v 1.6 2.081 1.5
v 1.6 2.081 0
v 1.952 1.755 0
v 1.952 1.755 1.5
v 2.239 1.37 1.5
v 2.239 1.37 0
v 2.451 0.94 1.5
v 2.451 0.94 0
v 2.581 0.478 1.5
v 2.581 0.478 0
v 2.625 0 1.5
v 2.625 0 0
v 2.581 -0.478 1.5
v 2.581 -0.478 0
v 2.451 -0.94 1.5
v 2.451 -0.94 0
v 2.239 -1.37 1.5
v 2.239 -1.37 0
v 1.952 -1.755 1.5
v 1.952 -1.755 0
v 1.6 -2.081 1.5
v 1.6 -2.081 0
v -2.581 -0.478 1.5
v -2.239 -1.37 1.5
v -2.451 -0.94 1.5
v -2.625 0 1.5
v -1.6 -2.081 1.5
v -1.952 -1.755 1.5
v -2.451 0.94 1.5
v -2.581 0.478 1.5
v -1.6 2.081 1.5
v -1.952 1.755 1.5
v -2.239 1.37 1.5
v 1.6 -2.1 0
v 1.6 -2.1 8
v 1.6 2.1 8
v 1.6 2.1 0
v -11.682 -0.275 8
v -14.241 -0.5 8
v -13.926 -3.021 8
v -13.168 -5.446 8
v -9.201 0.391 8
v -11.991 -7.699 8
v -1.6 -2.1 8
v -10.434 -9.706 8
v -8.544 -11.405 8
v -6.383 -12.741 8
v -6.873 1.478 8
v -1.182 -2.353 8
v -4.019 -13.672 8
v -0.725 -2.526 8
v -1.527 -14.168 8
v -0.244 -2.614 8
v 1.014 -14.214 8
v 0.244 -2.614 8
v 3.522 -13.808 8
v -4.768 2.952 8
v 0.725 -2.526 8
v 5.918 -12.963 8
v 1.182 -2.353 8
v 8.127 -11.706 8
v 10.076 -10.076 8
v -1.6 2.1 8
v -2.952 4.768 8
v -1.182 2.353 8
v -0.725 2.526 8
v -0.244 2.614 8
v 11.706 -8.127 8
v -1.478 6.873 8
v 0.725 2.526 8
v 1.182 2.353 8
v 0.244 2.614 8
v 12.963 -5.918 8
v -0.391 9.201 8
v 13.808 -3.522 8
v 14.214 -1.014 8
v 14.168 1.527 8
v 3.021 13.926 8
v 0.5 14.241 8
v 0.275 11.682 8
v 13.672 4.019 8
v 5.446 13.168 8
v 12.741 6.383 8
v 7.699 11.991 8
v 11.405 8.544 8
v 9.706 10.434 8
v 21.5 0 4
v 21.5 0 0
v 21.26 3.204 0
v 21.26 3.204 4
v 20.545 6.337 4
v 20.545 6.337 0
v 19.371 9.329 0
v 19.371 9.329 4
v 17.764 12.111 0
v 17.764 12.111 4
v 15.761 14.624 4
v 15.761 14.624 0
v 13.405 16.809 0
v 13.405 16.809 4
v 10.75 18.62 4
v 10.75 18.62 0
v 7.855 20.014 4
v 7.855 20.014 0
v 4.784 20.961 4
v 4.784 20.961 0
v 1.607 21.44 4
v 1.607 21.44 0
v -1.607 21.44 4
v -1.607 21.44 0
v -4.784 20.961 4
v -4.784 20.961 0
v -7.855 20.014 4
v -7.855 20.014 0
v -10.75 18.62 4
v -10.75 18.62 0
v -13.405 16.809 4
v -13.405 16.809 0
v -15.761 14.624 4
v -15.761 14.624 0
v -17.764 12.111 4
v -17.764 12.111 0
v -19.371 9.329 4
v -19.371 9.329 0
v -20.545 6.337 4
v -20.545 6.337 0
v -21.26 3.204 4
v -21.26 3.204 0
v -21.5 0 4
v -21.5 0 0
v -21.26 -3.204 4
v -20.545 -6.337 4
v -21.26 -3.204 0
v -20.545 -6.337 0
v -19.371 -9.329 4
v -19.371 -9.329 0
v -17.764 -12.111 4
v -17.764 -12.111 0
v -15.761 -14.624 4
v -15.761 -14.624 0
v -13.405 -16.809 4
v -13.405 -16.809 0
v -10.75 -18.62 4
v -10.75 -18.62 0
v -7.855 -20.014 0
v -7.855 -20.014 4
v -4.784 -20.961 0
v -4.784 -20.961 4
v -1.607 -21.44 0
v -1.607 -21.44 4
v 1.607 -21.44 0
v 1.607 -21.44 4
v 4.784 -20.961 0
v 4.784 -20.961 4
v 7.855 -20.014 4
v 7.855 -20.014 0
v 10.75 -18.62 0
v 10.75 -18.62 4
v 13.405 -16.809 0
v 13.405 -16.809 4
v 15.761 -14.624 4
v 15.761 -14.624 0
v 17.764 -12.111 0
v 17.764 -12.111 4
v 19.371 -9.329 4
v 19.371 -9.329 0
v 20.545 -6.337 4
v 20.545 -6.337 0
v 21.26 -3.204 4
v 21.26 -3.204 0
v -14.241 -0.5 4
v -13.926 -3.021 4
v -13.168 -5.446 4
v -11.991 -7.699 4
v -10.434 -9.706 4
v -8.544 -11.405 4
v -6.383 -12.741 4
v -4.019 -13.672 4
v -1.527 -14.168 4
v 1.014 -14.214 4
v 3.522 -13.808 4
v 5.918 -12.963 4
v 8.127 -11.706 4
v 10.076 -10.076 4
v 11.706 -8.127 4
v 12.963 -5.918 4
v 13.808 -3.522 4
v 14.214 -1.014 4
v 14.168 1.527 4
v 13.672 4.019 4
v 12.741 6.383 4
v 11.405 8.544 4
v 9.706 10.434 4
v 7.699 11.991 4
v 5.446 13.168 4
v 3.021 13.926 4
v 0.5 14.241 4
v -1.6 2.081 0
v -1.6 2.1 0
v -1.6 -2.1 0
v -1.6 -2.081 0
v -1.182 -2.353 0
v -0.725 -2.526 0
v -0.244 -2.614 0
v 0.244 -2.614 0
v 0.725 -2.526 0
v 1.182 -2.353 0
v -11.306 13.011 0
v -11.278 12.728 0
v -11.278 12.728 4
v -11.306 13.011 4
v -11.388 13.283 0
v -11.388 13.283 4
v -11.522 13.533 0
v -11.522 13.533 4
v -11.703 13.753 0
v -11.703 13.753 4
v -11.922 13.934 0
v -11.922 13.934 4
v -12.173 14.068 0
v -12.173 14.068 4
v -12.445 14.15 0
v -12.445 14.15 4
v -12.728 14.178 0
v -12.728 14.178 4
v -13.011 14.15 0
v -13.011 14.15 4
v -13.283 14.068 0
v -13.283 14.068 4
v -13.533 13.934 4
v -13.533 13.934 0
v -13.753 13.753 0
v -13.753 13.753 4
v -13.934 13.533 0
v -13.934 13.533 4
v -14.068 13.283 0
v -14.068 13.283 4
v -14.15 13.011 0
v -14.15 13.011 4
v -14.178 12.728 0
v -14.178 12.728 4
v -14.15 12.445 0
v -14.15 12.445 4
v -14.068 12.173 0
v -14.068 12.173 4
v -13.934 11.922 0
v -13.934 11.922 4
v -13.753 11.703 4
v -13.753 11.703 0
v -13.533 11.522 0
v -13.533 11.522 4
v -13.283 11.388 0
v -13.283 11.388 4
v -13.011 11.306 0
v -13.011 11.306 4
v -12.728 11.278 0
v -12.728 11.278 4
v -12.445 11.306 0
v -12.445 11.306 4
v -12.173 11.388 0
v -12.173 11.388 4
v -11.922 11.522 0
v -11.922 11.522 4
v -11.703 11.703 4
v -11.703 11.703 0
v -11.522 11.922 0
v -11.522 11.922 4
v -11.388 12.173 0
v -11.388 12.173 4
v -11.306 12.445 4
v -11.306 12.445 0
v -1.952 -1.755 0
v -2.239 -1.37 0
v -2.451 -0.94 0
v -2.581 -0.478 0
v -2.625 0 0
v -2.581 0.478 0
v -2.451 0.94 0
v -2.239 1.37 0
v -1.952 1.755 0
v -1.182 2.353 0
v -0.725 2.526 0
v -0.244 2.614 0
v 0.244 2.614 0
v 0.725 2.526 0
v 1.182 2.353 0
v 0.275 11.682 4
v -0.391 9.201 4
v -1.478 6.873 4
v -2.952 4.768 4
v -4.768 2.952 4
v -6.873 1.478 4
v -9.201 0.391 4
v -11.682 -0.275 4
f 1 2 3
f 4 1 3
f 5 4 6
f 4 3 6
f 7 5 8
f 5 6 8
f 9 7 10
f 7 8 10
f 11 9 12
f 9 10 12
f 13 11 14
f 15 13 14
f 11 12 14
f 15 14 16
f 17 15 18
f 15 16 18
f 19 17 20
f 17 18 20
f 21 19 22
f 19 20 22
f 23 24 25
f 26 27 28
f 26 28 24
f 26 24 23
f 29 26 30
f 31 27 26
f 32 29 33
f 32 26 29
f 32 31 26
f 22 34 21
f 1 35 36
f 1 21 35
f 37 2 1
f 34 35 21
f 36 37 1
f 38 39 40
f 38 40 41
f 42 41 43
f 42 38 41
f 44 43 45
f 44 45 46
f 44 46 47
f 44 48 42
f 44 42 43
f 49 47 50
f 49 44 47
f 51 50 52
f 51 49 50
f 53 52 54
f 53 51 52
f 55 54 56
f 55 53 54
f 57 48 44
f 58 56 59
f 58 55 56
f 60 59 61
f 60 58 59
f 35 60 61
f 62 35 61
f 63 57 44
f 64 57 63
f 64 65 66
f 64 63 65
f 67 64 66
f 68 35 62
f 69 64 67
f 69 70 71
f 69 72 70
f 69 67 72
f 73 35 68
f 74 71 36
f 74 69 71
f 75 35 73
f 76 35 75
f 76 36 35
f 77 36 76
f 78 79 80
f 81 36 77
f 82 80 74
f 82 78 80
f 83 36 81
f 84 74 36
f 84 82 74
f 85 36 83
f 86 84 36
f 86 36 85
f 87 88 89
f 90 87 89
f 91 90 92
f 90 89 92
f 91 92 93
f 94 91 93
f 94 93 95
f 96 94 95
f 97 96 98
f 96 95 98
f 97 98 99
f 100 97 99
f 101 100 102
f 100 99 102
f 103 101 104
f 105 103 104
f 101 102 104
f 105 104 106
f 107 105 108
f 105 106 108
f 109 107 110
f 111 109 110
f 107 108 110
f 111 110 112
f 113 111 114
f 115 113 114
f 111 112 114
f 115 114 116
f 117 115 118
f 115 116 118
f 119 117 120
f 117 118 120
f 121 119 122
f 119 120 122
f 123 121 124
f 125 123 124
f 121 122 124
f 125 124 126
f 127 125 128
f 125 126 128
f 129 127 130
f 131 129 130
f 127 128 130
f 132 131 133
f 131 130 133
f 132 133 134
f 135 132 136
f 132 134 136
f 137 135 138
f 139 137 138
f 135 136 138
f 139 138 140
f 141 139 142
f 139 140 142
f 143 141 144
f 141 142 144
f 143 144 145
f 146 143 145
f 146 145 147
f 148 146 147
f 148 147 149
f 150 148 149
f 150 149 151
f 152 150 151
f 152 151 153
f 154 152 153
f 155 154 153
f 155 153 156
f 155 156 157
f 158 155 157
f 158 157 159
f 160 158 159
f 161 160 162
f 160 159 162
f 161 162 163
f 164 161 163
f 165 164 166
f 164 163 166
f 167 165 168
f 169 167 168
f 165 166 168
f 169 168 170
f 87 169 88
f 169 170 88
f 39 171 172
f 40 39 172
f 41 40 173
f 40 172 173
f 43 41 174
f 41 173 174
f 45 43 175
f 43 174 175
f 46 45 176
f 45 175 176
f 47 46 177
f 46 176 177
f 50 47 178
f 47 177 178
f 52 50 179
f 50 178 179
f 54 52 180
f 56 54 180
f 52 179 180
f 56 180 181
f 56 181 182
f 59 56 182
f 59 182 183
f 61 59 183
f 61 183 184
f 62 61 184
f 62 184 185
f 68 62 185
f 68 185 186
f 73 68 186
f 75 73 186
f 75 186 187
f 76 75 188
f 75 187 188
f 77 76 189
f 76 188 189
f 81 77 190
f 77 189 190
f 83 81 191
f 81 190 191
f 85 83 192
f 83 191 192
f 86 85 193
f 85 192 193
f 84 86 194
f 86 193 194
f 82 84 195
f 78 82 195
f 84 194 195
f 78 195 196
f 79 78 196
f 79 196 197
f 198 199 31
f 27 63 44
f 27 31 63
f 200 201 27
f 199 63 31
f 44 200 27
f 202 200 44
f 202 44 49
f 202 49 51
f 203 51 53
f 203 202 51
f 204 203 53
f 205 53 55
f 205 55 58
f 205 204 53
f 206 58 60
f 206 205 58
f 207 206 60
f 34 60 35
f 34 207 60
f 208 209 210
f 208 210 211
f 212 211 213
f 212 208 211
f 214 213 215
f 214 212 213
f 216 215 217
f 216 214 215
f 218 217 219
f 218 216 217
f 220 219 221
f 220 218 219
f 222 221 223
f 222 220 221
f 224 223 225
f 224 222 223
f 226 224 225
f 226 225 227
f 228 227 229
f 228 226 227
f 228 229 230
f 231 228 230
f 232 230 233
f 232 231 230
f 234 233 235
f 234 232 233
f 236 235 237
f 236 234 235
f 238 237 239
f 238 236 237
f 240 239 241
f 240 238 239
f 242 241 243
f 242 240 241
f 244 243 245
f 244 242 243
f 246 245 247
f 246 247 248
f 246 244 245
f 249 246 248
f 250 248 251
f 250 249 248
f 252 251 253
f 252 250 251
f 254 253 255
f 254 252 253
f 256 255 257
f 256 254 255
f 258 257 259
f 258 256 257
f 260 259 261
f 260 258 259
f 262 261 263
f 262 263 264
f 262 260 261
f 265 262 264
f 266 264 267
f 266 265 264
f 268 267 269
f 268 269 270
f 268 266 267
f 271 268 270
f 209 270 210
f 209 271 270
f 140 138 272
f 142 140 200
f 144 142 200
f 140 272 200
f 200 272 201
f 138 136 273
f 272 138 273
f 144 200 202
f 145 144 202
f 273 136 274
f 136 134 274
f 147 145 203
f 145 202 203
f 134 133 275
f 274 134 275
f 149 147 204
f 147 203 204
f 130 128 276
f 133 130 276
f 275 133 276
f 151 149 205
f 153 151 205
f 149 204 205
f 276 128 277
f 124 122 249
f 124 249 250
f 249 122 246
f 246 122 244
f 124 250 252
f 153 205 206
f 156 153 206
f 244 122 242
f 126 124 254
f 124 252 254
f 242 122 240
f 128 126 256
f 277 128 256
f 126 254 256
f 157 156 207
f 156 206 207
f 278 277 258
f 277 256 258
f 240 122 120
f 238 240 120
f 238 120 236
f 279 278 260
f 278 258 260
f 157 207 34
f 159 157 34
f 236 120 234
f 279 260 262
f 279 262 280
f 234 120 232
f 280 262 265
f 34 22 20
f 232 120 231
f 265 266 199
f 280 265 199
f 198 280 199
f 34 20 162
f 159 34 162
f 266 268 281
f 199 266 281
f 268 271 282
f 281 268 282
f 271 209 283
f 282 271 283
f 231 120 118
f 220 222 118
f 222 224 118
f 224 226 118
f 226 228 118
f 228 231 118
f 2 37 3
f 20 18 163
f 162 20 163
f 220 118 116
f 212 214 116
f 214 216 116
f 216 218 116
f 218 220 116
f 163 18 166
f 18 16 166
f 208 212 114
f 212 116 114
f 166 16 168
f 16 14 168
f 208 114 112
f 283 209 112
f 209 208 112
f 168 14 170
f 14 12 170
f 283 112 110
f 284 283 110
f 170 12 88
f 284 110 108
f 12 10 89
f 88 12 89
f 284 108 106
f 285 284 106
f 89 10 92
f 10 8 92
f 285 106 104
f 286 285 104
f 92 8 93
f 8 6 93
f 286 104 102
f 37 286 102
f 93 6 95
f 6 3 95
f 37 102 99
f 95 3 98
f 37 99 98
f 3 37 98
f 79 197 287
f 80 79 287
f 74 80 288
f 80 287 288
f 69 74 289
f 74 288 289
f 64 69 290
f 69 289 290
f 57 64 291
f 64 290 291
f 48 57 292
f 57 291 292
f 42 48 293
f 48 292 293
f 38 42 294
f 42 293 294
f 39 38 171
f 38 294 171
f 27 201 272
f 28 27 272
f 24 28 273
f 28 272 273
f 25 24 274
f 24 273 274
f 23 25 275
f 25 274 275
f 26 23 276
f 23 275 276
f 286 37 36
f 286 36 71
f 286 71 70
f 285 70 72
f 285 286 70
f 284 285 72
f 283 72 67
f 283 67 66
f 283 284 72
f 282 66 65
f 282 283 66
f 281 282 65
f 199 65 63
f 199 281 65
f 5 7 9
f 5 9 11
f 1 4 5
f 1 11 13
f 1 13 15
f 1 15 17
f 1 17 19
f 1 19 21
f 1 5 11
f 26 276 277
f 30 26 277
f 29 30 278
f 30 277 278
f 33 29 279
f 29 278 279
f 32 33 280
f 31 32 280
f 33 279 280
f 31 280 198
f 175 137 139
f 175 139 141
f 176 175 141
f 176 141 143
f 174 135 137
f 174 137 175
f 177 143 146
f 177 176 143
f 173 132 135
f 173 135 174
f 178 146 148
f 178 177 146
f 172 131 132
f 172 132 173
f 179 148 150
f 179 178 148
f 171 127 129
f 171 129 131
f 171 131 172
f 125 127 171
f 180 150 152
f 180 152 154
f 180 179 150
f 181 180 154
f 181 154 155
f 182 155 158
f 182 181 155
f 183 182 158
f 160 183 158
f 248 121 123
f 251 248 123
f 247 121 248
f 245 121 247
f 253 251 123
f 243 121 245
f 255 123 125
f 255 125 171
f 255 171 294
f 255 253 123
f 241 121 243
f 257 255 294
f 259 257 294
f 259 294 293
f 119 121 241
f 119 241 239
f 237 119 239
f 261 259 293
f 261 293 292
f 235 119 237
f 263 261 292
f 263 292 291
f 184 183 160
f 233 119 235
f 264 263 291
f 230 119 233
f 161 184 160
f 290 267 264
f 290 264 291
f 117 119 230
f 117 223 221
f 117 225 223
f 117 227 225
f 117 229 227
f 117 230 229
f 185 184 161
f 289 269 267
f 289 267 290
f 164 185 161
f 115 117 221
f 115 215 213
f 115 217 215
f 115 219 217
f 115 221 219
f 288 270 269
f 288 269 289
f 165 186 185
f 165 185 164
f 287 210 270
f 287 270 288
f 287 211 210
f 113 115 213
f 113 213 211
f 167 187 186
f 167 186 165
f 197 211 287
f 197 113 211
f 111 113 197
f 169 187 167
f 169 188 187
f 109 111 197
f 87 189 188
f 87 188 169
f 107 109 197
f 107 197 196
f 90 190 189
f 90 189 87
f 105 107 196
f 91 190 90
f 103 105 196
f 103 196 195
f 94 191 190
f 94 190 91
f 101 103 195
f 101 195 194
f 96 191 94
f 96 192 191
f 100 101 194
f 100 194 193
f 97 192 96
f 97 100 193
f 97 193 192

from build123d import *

# Parameters (mm, degrees)
SKETCH4_R           = 21.5
SKETCH4_R_2         = 1.45
BOSS_EXTRUDE1_DEPTH = 4
BOSS_EXTRUDE2_DEPTH = 4
CUT_EXTRUDE1_DEPTH  = 1.5


with BuildPart() as part:
    # Sketch4 → Boss-Extrude1 (new body)
    with BuildSketch(Plane.XY):
        Circle(SKETCH4_R)
        with Locations((-12.727922061, 12.727922061)):
            Circle(SKETCH4_R_2, mode=Mode.SUBTRACT)
        with BuildLine():
            Line((-1.6, -2.1), (-1.6, 2.1))
            ThreePointArc((-1.6, 2.1), (0, 2.625143683), (1.6, 2.1))
            Line((1.6, 2.1), (1.6, -2.1))
            ThreePointArc((1.6, -2.1), (0, -2.625143683), (-1.6, -2.1))
        make_face(mode=Mode.SUBTRACT)
    extrude(amount=BOSS_EXTRUDE1_DEPTH)

    # Sketch5 → Boss-Extrude2 (add)
    with BuildSketch(Plane.XY.offset(4)):
        with BuildLine():
            ThreePointArc((-14.24122807, -0.499923047), (10.076271632, -10.076271632), (0.499923047, 14.24122807))
            ThreePointArc((0.499923047, 14.24122807), (-3.820227547, 3.820227547), (-14.24122807, -0.499923047))
        make_face()
        with BuildLine():
            Line((1.6, -2.1), (1.6, 2.1))
            ThreePointArc((1.6, 2.1), (0, 2.625143683), (-1.6, 2.1))
            Line((-1.6, 2.1), (-1.6, -2.1))
            ThreePointArc((-1.6, -2.1), (0, -2.625143683), (1.6, -2.1))
        make_face(mode=Mode.SUBTRACT)
    extrude(amount=BOSS_EXTRUDE2_DEPTH)

    # Sketch7 → Cut-Extrude1 (cut)
    with BuildSketch(Plane(origin=(0, 0, 0), x_dir=(-1, 0, 0), z_dir=(0, 0, -1))):
        with BuildLine():
            Line((-1.6, -2.081196616), (-1.6, 2.081196616))
            ThreePointArc((-1.6, 2.081196616), (-2.625143683, 0), (-1.6, -2.081196616))
        make_face()
        with BuildLine():
            ThreePointArc((2.625143683, 0), (2.354953211, 1.159989108), (1.6, 2.081196616))
            Line((1.6, 2.081196616), (1.6, -2.081196616))
            ThreePointArc((1.6, -2.081196616), (2.354953211, -1.159989108), (2.625143683, 0))
        make_face()
    extrude(amount=-CUT_EXTRUDE1_DEPTH, mode=Mode.SUBTRACT)


solid = part.part
